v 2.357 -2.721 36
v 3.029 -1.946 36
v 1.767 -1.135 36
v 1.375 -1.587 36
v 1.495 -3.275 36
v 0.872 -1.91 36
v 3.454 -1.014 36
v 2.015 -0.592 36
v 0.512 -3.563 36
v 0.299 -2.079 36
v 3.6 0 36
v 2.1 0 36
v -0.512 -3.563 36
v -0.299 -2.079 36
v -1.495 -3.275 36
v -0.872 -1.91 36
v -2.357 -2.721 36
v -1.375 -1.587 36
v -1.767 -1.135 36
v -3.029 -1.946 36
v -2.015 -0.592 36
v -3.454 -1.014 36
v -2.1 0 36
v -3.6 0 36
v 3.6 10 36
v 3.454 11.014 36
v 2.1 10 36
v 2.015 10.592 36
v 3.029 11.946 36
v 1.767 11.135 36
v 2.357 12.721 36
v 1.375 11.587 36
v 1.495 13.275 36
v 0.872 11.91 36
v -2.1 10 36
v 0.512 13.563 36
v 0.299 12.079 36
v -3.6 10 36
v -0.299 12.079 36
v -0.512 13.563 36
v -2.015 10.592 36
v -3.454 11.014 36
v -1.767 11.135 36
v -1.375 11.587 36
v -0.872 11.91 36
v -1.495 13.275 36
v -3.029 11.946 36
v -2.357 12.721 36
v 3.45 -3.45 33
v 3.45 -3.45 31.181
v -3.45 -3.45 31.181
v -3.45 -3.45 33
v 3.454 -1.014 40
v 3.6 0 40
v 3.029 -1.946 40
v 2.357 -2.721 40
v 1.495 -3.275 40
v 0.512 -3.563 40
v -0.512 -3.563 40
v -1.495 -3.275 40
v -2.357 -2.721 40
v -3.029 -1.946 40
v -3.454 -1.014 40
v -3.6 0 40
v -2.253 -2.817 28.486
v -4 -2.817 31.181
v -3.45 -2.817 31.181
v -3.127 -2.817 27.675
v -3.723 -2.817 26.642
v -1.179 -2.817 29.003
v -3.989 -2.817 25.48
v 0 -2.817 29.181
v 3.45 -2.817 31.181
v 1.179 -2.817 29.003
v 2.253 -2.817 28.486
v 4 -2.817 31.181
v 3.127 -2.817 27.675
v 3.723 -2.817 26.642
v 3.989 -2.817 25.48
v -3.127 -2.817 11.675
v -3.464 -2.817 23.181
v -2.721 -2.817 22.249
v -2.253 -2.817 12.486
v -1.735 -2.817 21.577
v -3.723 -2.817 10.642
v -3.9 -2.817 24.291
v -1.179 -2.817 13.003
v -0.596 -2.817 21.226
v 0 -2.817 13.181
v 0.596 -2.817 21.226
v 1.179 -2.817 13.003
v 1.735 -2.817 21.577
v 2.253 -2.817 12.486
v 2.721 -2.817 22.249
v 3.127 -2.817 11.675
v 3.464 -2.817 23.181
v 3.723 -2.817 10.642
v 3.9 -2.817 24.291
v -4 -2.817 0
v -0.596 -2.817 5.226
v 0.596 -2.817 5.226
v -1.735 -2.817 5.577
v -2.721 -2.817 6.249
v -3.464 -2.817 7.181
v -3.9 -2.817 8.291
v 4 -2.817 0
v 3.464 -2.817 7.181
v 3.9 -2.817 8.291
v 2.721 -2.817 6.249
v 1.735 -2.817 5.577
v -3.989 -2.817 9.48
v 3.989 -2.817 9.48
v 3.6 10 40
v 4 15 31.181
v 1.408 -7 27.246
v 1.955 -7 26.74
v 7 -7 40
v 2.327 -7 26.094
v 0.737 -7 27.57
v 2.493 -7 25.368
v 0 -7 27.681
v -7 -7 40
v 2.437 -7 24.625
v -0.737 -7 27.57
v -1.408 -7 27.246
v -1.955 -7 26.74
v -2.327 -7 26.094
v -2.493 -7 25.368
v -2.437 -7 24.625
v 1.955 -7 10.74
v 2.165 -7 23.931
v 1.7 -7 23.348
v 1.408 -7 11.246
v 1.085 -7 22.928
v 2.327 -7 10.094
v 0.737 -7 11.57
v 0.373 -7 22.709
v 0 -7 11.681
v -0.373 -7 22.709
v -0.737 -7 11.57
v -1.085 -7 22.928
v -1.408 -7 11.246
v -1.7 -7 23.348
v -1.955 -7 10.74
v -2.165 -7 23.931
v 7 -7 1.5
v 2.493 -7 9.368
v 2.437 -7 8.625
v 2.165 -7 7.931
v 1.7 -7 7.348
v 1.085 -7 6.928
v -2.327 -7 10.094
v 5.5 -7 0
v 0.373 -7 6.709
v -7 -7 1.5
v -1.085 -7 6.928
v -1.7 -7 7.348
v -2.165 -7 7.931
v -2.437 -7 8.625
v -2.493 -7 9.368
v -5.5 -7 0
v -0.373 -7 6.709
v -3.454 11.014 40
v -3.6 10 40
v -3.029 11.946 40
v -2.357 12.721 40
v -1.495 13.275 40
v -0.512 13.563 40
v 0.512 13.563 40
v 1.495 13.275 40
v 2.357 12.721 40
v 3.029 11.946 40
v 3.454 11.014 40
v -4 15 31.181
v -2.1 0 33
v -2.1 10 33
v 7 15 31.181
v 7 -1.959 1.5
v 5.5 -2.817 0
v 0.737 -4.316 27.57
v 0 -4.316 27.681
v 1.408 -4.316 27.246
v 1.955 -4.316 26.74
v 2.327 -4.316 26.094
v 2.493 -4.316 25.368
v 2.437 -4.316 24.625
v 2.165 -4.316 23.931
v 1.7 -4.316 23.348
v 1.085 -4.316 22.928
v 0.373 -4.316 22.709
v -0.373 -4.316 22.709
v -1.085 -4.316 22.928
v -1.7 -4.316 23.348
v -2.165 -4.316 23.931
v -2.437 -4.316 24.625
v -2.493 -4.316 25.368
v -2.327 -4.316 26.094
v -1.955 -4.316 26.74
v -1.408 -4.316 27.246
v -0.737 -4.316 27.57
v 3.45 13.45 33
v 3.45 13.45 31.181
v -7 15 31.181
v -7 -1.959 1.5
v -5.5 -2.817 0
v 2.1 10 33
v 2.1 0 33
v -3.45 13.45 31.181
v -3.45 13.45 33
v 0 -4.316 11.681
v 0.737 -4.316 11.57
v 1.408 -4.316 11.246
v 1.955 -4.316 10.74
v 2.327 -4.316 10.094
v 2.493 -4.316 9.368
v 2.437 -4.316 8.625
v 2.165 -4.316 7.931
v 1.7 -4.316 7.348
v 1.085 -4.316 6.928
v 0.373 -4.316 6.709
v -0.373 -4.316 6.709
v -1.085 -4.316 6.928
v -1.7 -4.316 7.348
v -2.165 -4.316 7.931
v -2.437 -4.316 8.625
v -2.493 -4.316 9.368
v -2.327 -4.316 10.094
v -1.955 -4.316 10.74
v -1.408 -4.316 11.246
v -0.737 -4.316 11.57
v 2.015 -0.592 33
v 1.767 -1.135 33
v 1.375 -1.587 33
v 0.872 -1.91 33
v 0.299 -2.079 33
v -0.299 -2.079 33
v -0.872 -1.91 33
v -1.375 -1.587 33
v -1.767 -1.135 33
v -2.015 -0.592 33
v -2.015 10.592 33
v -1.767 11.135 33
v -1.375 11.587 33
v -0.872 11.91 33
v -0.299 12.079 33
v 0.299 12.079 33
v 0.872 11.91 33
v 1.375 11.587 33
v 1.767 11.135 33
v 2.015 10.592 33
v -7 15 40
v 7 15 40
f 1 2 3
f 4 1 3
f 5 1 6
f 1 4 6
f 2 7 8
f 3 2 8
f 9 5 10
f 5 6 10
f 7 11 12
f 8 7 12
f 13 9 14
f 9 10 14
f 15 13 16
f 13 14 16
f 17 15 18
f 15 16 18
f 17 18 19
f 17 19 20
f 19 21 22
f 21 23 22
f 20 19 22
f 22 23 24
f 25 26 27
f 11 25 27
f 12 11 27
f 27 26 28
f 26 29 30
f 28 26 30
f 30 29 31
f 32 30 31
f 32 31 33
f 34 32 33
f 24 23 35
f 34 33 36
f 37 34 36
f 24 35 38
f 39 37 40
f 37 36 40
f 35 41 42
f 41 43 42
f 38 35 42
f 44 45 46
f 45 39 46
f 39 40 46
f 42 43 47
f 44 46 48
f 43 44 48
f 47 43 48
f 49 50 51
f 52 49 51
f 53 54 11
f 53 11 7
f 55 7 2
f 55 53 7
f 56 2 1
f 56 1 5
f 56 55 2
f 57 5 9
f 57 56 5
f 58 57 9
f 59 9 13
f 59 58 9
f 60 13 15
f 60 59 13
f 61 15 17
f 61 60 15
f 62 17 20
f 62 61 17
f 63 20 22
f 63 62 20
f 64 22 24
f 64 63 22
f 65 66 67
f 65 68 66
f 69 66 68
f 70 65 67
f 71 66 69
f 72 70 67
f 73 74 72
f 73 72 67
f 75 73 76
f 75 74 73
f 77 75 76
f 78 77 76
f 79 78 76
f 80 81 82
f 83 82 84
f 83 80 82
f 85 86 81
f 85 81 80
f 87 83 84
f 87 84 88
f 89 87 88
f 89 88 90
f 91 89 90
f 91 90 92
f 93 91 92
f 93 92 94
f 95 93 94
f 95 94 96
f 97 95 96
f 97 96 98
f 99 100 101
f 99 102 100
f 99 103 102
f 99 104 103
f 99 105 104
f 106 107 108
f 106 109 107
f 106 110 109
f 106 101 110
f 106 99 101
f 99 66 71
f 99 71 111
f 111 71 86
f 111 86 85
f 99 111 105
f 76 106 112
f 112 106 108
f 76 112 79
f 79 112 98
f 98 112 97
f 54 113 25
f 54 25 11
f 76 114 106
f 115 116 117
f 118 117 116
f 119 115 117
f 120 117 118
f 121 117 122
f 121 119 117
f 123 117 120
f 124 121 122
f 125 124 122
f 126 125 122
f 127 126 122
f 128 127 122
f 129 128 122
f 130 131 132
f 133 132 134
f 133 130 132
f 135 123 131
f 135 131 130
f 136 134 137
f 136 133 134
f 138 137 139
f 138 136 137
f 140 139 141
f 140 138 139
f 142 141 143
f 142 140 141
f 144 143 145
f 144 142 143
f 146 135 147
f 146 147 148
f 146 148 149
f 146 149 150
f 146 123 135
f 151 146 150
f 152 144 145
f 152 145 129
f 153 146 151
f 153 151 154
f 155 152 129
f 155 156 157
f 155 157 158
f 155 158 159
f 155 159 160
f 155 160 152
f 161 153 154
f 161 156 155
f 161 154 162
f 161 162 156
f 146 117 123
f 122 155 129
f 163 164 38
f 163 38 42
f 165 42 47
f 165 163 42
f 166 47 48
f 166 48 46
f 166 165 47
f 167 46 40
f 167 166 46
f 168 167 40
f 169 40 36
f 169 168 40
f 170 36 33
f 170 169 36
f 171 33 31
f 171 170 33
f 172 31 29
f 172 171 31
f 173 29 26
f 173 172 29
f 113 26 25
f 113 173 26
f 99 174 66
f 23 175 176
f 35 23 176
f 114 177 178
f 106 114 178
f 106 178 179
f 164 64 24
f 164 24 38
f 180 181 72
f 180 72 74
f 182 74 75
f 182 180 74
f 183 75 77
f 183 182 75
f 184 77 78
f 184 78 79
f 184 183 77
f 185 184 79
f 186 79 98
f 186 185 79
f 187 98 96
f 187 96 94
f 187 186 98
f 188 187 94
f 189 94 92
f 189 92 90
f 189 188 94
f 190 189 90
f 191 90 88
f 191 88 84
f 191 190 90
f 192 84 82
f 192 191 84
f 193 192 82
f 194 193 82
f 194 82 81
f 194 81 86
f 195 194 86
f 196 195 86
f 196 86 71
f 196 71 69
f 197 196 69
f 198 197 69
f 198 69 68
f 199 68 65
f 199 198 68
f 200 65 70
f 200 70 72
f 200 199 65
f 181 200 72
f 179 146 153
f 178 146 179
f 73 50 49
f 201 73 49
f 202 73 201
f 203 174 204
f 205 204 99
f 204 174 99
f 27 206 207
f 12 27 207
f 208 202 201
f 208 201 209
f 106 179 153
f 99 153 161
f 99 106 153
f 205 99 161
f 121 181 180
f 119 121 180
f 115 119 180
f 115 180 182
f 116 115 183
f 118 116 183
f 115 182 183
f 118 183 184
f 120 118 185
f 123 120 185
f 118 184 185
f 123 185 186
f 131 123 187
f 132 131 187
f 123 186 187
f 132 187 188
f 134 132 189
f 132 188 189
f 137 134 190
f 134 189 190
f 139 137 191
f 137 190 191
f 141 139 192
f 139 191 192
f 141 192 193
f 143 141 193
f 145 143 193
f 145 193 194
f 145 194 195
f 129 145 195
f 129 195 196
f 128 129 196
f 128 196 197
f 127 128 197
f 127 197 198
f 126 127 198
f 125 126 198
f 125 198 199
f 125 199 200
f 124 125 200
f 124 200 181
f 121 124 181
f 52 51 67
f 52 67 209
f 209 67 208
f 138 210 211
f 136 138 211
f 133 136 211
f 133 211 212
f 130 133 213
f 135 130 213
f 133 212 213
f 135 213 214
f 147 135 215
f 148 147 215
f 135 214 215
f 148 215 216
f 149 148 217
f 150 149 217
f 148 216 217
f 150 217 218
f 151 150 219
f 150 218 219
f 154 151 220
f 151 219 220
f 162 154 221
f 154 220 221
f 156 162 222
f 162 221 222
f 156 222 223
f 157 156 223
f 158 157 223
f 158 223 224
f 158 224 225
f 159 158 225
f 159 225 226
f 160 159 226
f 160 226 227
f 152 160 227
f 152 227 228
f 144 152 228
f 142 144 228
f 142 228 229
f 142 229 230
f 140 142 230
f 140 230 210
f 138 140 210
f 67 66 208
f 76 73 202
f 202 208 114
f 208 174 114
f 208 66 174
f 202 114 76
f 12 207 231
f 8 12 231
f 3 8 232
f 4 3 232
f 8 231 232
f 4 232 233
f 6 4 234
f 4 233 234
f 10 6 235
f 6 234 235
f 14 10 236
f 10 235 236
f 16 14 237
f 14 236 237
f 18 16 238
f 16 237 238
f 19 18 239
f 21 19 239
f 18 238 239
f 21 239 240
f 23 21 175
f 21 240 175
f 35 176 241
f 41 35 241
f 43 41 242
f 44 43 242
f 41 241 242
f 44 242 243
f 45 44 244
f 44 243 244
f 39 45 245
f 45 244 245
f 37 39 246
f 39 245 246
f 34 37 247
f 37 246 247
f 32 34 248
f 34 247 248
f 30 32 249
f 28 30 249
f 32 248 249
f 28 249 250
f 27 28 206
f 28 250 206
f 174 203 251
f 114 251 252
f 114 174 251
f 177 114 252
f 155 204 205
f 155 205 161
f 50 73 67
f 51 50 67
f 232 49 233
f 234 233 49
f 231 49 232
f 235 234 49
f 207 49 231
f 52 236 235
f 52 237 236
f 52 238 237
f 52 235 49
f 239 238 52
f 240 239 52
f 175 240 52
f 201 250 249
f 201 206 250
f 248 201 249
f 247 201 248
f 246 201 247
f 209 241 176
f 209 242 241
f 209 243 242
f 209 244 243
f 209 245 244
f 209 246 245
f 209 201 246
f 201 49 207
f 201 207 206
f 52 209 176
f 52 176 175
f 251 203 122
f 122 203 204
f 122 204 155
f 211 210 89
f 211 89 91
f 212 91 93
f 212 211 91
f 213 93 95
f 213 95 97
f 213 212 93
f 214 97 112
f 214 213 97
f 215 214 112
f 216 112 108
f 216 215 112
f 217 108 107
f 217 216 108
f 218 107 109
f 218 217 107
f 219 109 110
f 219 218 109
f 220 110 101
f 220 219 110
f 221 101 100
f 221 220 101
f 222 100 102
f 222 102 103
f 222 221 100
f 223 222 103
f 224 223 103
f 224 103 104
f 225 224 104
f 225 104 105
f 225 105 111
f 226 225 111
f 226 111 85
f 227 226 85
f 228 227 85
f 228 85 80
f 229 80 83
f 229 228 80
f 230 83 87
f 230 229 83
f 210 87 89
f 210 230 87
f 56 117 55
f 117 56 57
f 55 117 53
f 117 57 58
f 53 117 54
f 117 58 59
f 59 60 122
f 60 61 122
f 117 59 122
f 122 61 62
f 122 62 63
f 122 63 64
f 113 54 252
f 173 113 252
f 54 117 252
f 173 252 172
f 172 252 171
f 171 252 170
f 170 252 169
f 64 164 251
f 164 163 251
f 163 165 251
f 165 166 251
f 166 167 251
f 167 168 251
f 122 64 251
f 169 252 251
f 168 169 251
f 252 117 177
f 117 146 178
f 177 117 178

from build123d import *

# Parameters (mm, degrees)
SALIENTE_EXTRUIR1_DEPTH = 40
CORTAR_EXTRUIR1_DEPTH   = 4
CORTAR_EXTRUIR2_DEPTH   = 45.955533586
CROQUIS4_W              = 8
CROQUIS4_H              = 31.180864131
CORTAR_EXTRUIR3_DEPTH   = 17.81659
CROQUIS5_W              = 6.9
CROQUIS5_H              = 16.9
CORTAR_EXTRUIR4_DEPTH   = 1.819135869
CROQUIS6_R              = 2.5
CORTAR_EXTRUIR5_DEPTH   = 45.34445566
CHAFL_N1_SIZE           = 1.5
CHAFL_N2_SIZE           = 1.5


with BuildPart() as part:
    # Croquis1 → Saliente-Extruir1 (new body)
    with BuildSketch(Plane.XY):
        Polygon((-7, 7), (-7, 15), (7, 15), (7, 7), (7, -7), (-7, -7), align=None)
        with BuildLine():
            Line((-2.1, 0), (-2.1, 10))
            ThreePointArc((-2.1, 10), (0, 12.1), (2.1, 10))
            Line((2.1, 10), (2.1, 0))
            ThreePointArc((2.1, 0), (0, -2.1), (-2.1, 0))
        make_face(mode=Mode.SUBTRACT)
    extrude(amount=SALIENTE_EXTRUIR1_DEPTH)

    # Croquis2 → Cortar-Extruir1 (cut)
    with BuildSketch(Plane.XY.offset(40)):
        with BuildLine():
            Line((-3.6, 0), (-3.6, 10))
            ThreePointArc((-3.6, 10), (0, 13.6), (3.6, 10))
            Line((3.6, 10), (3.6, 0))
            ThreePointArc((3.6, 0), (0, -3.6), (-3.6, 0))
        make_face()
    extrude(amount=-CORTAR_EXTRUIR1_DEPTH, mode=Mode.SUBTRACT)

    # Croquis3 → Cortar-Extruir2 (cut, through all)
    with BuildSketch(Plane(origin=(7, 0, 0), x_dir=(0, 0, -1), z_dir=(1, 0, 0))):
        Polygon((0, 15), (-31.180864131, 15), (0, -2.81658631), align=None)
    extrude(amount=-CORTAR_EXTRUIR2_DEPTH, mode=Mode.SUBTRACT)

    # Croquis4 → Cortar-Extruir3 (cut)
    with BuildSketch(Plane(origin=(0, 15, 0), x_dir=(1, 0, 0), z_dir=(0, 1, 0))):
        with Locations((0, -15.590432066)):
            Rectangle(CROQUIS4_W, CROQUIS4_H)
    extrude(amount=-CORTAR_EXTRUIR3_DEPTH, mode=Mode.SUBTRACT)

    # Croquis5 → Cortar-Extruir4 (cut)
    with BuildSketch(Plane(origin=(0, 0, 31.180864131), x_dir=(-1, 0, 0), z_dir=(0, 0, -1))):
        with Locations((0, 5)):
            Rectangle(CROQUIS5_W, CROQUIS5_H)
    extrude(amount=-CORTAR_EXTRUIR4_DEPTH, mode=Mode.SUBTRACT)

    # Croquis6 → Cortar-Extruir5 (cut, through all)
    with BuildSketch(Plane(origin=(0, -2.81658631, 0), x_dir=(1, 0, 0), z_dir=(0, 1, 0))):
        with Locations(Location((0, -9.180864131, 0), (0, 0, 270))):
            Circle(CROQUIS6_R)
        with Locations(Location((0, -25.180864131, 0), (0, 0, 270))):
            Circle(CROQUIS6_R)
    extrude(amount=-CORTAR_EXTRUIR5_DEPTH, mode=Mode.SUBTRACT)

    # Chaflán1
    chafl_n1_edges = [part.edges().sort_by_distance(p)[0] for p in [
        (0, -2.81659, 6.680864131),
        (0, -2.81659, 22.680864131),
    ]]
    chamfer(chafl_n1_edges, length=CHAFL_N1_SIZE - 0.0001)  # a hair under: the kernel refuses the full size

    # Chaflán2
    chafl_n2_edges = [part.edges().sort_by_distance(p)[0] for p in [
        (-7, -4.908293155, 0),
        (7, -4.908293155, 0),
    ]]
    chamfer(chafl_n2_edges, length=CHAFL_N2_SIZE)


solid = part.part
